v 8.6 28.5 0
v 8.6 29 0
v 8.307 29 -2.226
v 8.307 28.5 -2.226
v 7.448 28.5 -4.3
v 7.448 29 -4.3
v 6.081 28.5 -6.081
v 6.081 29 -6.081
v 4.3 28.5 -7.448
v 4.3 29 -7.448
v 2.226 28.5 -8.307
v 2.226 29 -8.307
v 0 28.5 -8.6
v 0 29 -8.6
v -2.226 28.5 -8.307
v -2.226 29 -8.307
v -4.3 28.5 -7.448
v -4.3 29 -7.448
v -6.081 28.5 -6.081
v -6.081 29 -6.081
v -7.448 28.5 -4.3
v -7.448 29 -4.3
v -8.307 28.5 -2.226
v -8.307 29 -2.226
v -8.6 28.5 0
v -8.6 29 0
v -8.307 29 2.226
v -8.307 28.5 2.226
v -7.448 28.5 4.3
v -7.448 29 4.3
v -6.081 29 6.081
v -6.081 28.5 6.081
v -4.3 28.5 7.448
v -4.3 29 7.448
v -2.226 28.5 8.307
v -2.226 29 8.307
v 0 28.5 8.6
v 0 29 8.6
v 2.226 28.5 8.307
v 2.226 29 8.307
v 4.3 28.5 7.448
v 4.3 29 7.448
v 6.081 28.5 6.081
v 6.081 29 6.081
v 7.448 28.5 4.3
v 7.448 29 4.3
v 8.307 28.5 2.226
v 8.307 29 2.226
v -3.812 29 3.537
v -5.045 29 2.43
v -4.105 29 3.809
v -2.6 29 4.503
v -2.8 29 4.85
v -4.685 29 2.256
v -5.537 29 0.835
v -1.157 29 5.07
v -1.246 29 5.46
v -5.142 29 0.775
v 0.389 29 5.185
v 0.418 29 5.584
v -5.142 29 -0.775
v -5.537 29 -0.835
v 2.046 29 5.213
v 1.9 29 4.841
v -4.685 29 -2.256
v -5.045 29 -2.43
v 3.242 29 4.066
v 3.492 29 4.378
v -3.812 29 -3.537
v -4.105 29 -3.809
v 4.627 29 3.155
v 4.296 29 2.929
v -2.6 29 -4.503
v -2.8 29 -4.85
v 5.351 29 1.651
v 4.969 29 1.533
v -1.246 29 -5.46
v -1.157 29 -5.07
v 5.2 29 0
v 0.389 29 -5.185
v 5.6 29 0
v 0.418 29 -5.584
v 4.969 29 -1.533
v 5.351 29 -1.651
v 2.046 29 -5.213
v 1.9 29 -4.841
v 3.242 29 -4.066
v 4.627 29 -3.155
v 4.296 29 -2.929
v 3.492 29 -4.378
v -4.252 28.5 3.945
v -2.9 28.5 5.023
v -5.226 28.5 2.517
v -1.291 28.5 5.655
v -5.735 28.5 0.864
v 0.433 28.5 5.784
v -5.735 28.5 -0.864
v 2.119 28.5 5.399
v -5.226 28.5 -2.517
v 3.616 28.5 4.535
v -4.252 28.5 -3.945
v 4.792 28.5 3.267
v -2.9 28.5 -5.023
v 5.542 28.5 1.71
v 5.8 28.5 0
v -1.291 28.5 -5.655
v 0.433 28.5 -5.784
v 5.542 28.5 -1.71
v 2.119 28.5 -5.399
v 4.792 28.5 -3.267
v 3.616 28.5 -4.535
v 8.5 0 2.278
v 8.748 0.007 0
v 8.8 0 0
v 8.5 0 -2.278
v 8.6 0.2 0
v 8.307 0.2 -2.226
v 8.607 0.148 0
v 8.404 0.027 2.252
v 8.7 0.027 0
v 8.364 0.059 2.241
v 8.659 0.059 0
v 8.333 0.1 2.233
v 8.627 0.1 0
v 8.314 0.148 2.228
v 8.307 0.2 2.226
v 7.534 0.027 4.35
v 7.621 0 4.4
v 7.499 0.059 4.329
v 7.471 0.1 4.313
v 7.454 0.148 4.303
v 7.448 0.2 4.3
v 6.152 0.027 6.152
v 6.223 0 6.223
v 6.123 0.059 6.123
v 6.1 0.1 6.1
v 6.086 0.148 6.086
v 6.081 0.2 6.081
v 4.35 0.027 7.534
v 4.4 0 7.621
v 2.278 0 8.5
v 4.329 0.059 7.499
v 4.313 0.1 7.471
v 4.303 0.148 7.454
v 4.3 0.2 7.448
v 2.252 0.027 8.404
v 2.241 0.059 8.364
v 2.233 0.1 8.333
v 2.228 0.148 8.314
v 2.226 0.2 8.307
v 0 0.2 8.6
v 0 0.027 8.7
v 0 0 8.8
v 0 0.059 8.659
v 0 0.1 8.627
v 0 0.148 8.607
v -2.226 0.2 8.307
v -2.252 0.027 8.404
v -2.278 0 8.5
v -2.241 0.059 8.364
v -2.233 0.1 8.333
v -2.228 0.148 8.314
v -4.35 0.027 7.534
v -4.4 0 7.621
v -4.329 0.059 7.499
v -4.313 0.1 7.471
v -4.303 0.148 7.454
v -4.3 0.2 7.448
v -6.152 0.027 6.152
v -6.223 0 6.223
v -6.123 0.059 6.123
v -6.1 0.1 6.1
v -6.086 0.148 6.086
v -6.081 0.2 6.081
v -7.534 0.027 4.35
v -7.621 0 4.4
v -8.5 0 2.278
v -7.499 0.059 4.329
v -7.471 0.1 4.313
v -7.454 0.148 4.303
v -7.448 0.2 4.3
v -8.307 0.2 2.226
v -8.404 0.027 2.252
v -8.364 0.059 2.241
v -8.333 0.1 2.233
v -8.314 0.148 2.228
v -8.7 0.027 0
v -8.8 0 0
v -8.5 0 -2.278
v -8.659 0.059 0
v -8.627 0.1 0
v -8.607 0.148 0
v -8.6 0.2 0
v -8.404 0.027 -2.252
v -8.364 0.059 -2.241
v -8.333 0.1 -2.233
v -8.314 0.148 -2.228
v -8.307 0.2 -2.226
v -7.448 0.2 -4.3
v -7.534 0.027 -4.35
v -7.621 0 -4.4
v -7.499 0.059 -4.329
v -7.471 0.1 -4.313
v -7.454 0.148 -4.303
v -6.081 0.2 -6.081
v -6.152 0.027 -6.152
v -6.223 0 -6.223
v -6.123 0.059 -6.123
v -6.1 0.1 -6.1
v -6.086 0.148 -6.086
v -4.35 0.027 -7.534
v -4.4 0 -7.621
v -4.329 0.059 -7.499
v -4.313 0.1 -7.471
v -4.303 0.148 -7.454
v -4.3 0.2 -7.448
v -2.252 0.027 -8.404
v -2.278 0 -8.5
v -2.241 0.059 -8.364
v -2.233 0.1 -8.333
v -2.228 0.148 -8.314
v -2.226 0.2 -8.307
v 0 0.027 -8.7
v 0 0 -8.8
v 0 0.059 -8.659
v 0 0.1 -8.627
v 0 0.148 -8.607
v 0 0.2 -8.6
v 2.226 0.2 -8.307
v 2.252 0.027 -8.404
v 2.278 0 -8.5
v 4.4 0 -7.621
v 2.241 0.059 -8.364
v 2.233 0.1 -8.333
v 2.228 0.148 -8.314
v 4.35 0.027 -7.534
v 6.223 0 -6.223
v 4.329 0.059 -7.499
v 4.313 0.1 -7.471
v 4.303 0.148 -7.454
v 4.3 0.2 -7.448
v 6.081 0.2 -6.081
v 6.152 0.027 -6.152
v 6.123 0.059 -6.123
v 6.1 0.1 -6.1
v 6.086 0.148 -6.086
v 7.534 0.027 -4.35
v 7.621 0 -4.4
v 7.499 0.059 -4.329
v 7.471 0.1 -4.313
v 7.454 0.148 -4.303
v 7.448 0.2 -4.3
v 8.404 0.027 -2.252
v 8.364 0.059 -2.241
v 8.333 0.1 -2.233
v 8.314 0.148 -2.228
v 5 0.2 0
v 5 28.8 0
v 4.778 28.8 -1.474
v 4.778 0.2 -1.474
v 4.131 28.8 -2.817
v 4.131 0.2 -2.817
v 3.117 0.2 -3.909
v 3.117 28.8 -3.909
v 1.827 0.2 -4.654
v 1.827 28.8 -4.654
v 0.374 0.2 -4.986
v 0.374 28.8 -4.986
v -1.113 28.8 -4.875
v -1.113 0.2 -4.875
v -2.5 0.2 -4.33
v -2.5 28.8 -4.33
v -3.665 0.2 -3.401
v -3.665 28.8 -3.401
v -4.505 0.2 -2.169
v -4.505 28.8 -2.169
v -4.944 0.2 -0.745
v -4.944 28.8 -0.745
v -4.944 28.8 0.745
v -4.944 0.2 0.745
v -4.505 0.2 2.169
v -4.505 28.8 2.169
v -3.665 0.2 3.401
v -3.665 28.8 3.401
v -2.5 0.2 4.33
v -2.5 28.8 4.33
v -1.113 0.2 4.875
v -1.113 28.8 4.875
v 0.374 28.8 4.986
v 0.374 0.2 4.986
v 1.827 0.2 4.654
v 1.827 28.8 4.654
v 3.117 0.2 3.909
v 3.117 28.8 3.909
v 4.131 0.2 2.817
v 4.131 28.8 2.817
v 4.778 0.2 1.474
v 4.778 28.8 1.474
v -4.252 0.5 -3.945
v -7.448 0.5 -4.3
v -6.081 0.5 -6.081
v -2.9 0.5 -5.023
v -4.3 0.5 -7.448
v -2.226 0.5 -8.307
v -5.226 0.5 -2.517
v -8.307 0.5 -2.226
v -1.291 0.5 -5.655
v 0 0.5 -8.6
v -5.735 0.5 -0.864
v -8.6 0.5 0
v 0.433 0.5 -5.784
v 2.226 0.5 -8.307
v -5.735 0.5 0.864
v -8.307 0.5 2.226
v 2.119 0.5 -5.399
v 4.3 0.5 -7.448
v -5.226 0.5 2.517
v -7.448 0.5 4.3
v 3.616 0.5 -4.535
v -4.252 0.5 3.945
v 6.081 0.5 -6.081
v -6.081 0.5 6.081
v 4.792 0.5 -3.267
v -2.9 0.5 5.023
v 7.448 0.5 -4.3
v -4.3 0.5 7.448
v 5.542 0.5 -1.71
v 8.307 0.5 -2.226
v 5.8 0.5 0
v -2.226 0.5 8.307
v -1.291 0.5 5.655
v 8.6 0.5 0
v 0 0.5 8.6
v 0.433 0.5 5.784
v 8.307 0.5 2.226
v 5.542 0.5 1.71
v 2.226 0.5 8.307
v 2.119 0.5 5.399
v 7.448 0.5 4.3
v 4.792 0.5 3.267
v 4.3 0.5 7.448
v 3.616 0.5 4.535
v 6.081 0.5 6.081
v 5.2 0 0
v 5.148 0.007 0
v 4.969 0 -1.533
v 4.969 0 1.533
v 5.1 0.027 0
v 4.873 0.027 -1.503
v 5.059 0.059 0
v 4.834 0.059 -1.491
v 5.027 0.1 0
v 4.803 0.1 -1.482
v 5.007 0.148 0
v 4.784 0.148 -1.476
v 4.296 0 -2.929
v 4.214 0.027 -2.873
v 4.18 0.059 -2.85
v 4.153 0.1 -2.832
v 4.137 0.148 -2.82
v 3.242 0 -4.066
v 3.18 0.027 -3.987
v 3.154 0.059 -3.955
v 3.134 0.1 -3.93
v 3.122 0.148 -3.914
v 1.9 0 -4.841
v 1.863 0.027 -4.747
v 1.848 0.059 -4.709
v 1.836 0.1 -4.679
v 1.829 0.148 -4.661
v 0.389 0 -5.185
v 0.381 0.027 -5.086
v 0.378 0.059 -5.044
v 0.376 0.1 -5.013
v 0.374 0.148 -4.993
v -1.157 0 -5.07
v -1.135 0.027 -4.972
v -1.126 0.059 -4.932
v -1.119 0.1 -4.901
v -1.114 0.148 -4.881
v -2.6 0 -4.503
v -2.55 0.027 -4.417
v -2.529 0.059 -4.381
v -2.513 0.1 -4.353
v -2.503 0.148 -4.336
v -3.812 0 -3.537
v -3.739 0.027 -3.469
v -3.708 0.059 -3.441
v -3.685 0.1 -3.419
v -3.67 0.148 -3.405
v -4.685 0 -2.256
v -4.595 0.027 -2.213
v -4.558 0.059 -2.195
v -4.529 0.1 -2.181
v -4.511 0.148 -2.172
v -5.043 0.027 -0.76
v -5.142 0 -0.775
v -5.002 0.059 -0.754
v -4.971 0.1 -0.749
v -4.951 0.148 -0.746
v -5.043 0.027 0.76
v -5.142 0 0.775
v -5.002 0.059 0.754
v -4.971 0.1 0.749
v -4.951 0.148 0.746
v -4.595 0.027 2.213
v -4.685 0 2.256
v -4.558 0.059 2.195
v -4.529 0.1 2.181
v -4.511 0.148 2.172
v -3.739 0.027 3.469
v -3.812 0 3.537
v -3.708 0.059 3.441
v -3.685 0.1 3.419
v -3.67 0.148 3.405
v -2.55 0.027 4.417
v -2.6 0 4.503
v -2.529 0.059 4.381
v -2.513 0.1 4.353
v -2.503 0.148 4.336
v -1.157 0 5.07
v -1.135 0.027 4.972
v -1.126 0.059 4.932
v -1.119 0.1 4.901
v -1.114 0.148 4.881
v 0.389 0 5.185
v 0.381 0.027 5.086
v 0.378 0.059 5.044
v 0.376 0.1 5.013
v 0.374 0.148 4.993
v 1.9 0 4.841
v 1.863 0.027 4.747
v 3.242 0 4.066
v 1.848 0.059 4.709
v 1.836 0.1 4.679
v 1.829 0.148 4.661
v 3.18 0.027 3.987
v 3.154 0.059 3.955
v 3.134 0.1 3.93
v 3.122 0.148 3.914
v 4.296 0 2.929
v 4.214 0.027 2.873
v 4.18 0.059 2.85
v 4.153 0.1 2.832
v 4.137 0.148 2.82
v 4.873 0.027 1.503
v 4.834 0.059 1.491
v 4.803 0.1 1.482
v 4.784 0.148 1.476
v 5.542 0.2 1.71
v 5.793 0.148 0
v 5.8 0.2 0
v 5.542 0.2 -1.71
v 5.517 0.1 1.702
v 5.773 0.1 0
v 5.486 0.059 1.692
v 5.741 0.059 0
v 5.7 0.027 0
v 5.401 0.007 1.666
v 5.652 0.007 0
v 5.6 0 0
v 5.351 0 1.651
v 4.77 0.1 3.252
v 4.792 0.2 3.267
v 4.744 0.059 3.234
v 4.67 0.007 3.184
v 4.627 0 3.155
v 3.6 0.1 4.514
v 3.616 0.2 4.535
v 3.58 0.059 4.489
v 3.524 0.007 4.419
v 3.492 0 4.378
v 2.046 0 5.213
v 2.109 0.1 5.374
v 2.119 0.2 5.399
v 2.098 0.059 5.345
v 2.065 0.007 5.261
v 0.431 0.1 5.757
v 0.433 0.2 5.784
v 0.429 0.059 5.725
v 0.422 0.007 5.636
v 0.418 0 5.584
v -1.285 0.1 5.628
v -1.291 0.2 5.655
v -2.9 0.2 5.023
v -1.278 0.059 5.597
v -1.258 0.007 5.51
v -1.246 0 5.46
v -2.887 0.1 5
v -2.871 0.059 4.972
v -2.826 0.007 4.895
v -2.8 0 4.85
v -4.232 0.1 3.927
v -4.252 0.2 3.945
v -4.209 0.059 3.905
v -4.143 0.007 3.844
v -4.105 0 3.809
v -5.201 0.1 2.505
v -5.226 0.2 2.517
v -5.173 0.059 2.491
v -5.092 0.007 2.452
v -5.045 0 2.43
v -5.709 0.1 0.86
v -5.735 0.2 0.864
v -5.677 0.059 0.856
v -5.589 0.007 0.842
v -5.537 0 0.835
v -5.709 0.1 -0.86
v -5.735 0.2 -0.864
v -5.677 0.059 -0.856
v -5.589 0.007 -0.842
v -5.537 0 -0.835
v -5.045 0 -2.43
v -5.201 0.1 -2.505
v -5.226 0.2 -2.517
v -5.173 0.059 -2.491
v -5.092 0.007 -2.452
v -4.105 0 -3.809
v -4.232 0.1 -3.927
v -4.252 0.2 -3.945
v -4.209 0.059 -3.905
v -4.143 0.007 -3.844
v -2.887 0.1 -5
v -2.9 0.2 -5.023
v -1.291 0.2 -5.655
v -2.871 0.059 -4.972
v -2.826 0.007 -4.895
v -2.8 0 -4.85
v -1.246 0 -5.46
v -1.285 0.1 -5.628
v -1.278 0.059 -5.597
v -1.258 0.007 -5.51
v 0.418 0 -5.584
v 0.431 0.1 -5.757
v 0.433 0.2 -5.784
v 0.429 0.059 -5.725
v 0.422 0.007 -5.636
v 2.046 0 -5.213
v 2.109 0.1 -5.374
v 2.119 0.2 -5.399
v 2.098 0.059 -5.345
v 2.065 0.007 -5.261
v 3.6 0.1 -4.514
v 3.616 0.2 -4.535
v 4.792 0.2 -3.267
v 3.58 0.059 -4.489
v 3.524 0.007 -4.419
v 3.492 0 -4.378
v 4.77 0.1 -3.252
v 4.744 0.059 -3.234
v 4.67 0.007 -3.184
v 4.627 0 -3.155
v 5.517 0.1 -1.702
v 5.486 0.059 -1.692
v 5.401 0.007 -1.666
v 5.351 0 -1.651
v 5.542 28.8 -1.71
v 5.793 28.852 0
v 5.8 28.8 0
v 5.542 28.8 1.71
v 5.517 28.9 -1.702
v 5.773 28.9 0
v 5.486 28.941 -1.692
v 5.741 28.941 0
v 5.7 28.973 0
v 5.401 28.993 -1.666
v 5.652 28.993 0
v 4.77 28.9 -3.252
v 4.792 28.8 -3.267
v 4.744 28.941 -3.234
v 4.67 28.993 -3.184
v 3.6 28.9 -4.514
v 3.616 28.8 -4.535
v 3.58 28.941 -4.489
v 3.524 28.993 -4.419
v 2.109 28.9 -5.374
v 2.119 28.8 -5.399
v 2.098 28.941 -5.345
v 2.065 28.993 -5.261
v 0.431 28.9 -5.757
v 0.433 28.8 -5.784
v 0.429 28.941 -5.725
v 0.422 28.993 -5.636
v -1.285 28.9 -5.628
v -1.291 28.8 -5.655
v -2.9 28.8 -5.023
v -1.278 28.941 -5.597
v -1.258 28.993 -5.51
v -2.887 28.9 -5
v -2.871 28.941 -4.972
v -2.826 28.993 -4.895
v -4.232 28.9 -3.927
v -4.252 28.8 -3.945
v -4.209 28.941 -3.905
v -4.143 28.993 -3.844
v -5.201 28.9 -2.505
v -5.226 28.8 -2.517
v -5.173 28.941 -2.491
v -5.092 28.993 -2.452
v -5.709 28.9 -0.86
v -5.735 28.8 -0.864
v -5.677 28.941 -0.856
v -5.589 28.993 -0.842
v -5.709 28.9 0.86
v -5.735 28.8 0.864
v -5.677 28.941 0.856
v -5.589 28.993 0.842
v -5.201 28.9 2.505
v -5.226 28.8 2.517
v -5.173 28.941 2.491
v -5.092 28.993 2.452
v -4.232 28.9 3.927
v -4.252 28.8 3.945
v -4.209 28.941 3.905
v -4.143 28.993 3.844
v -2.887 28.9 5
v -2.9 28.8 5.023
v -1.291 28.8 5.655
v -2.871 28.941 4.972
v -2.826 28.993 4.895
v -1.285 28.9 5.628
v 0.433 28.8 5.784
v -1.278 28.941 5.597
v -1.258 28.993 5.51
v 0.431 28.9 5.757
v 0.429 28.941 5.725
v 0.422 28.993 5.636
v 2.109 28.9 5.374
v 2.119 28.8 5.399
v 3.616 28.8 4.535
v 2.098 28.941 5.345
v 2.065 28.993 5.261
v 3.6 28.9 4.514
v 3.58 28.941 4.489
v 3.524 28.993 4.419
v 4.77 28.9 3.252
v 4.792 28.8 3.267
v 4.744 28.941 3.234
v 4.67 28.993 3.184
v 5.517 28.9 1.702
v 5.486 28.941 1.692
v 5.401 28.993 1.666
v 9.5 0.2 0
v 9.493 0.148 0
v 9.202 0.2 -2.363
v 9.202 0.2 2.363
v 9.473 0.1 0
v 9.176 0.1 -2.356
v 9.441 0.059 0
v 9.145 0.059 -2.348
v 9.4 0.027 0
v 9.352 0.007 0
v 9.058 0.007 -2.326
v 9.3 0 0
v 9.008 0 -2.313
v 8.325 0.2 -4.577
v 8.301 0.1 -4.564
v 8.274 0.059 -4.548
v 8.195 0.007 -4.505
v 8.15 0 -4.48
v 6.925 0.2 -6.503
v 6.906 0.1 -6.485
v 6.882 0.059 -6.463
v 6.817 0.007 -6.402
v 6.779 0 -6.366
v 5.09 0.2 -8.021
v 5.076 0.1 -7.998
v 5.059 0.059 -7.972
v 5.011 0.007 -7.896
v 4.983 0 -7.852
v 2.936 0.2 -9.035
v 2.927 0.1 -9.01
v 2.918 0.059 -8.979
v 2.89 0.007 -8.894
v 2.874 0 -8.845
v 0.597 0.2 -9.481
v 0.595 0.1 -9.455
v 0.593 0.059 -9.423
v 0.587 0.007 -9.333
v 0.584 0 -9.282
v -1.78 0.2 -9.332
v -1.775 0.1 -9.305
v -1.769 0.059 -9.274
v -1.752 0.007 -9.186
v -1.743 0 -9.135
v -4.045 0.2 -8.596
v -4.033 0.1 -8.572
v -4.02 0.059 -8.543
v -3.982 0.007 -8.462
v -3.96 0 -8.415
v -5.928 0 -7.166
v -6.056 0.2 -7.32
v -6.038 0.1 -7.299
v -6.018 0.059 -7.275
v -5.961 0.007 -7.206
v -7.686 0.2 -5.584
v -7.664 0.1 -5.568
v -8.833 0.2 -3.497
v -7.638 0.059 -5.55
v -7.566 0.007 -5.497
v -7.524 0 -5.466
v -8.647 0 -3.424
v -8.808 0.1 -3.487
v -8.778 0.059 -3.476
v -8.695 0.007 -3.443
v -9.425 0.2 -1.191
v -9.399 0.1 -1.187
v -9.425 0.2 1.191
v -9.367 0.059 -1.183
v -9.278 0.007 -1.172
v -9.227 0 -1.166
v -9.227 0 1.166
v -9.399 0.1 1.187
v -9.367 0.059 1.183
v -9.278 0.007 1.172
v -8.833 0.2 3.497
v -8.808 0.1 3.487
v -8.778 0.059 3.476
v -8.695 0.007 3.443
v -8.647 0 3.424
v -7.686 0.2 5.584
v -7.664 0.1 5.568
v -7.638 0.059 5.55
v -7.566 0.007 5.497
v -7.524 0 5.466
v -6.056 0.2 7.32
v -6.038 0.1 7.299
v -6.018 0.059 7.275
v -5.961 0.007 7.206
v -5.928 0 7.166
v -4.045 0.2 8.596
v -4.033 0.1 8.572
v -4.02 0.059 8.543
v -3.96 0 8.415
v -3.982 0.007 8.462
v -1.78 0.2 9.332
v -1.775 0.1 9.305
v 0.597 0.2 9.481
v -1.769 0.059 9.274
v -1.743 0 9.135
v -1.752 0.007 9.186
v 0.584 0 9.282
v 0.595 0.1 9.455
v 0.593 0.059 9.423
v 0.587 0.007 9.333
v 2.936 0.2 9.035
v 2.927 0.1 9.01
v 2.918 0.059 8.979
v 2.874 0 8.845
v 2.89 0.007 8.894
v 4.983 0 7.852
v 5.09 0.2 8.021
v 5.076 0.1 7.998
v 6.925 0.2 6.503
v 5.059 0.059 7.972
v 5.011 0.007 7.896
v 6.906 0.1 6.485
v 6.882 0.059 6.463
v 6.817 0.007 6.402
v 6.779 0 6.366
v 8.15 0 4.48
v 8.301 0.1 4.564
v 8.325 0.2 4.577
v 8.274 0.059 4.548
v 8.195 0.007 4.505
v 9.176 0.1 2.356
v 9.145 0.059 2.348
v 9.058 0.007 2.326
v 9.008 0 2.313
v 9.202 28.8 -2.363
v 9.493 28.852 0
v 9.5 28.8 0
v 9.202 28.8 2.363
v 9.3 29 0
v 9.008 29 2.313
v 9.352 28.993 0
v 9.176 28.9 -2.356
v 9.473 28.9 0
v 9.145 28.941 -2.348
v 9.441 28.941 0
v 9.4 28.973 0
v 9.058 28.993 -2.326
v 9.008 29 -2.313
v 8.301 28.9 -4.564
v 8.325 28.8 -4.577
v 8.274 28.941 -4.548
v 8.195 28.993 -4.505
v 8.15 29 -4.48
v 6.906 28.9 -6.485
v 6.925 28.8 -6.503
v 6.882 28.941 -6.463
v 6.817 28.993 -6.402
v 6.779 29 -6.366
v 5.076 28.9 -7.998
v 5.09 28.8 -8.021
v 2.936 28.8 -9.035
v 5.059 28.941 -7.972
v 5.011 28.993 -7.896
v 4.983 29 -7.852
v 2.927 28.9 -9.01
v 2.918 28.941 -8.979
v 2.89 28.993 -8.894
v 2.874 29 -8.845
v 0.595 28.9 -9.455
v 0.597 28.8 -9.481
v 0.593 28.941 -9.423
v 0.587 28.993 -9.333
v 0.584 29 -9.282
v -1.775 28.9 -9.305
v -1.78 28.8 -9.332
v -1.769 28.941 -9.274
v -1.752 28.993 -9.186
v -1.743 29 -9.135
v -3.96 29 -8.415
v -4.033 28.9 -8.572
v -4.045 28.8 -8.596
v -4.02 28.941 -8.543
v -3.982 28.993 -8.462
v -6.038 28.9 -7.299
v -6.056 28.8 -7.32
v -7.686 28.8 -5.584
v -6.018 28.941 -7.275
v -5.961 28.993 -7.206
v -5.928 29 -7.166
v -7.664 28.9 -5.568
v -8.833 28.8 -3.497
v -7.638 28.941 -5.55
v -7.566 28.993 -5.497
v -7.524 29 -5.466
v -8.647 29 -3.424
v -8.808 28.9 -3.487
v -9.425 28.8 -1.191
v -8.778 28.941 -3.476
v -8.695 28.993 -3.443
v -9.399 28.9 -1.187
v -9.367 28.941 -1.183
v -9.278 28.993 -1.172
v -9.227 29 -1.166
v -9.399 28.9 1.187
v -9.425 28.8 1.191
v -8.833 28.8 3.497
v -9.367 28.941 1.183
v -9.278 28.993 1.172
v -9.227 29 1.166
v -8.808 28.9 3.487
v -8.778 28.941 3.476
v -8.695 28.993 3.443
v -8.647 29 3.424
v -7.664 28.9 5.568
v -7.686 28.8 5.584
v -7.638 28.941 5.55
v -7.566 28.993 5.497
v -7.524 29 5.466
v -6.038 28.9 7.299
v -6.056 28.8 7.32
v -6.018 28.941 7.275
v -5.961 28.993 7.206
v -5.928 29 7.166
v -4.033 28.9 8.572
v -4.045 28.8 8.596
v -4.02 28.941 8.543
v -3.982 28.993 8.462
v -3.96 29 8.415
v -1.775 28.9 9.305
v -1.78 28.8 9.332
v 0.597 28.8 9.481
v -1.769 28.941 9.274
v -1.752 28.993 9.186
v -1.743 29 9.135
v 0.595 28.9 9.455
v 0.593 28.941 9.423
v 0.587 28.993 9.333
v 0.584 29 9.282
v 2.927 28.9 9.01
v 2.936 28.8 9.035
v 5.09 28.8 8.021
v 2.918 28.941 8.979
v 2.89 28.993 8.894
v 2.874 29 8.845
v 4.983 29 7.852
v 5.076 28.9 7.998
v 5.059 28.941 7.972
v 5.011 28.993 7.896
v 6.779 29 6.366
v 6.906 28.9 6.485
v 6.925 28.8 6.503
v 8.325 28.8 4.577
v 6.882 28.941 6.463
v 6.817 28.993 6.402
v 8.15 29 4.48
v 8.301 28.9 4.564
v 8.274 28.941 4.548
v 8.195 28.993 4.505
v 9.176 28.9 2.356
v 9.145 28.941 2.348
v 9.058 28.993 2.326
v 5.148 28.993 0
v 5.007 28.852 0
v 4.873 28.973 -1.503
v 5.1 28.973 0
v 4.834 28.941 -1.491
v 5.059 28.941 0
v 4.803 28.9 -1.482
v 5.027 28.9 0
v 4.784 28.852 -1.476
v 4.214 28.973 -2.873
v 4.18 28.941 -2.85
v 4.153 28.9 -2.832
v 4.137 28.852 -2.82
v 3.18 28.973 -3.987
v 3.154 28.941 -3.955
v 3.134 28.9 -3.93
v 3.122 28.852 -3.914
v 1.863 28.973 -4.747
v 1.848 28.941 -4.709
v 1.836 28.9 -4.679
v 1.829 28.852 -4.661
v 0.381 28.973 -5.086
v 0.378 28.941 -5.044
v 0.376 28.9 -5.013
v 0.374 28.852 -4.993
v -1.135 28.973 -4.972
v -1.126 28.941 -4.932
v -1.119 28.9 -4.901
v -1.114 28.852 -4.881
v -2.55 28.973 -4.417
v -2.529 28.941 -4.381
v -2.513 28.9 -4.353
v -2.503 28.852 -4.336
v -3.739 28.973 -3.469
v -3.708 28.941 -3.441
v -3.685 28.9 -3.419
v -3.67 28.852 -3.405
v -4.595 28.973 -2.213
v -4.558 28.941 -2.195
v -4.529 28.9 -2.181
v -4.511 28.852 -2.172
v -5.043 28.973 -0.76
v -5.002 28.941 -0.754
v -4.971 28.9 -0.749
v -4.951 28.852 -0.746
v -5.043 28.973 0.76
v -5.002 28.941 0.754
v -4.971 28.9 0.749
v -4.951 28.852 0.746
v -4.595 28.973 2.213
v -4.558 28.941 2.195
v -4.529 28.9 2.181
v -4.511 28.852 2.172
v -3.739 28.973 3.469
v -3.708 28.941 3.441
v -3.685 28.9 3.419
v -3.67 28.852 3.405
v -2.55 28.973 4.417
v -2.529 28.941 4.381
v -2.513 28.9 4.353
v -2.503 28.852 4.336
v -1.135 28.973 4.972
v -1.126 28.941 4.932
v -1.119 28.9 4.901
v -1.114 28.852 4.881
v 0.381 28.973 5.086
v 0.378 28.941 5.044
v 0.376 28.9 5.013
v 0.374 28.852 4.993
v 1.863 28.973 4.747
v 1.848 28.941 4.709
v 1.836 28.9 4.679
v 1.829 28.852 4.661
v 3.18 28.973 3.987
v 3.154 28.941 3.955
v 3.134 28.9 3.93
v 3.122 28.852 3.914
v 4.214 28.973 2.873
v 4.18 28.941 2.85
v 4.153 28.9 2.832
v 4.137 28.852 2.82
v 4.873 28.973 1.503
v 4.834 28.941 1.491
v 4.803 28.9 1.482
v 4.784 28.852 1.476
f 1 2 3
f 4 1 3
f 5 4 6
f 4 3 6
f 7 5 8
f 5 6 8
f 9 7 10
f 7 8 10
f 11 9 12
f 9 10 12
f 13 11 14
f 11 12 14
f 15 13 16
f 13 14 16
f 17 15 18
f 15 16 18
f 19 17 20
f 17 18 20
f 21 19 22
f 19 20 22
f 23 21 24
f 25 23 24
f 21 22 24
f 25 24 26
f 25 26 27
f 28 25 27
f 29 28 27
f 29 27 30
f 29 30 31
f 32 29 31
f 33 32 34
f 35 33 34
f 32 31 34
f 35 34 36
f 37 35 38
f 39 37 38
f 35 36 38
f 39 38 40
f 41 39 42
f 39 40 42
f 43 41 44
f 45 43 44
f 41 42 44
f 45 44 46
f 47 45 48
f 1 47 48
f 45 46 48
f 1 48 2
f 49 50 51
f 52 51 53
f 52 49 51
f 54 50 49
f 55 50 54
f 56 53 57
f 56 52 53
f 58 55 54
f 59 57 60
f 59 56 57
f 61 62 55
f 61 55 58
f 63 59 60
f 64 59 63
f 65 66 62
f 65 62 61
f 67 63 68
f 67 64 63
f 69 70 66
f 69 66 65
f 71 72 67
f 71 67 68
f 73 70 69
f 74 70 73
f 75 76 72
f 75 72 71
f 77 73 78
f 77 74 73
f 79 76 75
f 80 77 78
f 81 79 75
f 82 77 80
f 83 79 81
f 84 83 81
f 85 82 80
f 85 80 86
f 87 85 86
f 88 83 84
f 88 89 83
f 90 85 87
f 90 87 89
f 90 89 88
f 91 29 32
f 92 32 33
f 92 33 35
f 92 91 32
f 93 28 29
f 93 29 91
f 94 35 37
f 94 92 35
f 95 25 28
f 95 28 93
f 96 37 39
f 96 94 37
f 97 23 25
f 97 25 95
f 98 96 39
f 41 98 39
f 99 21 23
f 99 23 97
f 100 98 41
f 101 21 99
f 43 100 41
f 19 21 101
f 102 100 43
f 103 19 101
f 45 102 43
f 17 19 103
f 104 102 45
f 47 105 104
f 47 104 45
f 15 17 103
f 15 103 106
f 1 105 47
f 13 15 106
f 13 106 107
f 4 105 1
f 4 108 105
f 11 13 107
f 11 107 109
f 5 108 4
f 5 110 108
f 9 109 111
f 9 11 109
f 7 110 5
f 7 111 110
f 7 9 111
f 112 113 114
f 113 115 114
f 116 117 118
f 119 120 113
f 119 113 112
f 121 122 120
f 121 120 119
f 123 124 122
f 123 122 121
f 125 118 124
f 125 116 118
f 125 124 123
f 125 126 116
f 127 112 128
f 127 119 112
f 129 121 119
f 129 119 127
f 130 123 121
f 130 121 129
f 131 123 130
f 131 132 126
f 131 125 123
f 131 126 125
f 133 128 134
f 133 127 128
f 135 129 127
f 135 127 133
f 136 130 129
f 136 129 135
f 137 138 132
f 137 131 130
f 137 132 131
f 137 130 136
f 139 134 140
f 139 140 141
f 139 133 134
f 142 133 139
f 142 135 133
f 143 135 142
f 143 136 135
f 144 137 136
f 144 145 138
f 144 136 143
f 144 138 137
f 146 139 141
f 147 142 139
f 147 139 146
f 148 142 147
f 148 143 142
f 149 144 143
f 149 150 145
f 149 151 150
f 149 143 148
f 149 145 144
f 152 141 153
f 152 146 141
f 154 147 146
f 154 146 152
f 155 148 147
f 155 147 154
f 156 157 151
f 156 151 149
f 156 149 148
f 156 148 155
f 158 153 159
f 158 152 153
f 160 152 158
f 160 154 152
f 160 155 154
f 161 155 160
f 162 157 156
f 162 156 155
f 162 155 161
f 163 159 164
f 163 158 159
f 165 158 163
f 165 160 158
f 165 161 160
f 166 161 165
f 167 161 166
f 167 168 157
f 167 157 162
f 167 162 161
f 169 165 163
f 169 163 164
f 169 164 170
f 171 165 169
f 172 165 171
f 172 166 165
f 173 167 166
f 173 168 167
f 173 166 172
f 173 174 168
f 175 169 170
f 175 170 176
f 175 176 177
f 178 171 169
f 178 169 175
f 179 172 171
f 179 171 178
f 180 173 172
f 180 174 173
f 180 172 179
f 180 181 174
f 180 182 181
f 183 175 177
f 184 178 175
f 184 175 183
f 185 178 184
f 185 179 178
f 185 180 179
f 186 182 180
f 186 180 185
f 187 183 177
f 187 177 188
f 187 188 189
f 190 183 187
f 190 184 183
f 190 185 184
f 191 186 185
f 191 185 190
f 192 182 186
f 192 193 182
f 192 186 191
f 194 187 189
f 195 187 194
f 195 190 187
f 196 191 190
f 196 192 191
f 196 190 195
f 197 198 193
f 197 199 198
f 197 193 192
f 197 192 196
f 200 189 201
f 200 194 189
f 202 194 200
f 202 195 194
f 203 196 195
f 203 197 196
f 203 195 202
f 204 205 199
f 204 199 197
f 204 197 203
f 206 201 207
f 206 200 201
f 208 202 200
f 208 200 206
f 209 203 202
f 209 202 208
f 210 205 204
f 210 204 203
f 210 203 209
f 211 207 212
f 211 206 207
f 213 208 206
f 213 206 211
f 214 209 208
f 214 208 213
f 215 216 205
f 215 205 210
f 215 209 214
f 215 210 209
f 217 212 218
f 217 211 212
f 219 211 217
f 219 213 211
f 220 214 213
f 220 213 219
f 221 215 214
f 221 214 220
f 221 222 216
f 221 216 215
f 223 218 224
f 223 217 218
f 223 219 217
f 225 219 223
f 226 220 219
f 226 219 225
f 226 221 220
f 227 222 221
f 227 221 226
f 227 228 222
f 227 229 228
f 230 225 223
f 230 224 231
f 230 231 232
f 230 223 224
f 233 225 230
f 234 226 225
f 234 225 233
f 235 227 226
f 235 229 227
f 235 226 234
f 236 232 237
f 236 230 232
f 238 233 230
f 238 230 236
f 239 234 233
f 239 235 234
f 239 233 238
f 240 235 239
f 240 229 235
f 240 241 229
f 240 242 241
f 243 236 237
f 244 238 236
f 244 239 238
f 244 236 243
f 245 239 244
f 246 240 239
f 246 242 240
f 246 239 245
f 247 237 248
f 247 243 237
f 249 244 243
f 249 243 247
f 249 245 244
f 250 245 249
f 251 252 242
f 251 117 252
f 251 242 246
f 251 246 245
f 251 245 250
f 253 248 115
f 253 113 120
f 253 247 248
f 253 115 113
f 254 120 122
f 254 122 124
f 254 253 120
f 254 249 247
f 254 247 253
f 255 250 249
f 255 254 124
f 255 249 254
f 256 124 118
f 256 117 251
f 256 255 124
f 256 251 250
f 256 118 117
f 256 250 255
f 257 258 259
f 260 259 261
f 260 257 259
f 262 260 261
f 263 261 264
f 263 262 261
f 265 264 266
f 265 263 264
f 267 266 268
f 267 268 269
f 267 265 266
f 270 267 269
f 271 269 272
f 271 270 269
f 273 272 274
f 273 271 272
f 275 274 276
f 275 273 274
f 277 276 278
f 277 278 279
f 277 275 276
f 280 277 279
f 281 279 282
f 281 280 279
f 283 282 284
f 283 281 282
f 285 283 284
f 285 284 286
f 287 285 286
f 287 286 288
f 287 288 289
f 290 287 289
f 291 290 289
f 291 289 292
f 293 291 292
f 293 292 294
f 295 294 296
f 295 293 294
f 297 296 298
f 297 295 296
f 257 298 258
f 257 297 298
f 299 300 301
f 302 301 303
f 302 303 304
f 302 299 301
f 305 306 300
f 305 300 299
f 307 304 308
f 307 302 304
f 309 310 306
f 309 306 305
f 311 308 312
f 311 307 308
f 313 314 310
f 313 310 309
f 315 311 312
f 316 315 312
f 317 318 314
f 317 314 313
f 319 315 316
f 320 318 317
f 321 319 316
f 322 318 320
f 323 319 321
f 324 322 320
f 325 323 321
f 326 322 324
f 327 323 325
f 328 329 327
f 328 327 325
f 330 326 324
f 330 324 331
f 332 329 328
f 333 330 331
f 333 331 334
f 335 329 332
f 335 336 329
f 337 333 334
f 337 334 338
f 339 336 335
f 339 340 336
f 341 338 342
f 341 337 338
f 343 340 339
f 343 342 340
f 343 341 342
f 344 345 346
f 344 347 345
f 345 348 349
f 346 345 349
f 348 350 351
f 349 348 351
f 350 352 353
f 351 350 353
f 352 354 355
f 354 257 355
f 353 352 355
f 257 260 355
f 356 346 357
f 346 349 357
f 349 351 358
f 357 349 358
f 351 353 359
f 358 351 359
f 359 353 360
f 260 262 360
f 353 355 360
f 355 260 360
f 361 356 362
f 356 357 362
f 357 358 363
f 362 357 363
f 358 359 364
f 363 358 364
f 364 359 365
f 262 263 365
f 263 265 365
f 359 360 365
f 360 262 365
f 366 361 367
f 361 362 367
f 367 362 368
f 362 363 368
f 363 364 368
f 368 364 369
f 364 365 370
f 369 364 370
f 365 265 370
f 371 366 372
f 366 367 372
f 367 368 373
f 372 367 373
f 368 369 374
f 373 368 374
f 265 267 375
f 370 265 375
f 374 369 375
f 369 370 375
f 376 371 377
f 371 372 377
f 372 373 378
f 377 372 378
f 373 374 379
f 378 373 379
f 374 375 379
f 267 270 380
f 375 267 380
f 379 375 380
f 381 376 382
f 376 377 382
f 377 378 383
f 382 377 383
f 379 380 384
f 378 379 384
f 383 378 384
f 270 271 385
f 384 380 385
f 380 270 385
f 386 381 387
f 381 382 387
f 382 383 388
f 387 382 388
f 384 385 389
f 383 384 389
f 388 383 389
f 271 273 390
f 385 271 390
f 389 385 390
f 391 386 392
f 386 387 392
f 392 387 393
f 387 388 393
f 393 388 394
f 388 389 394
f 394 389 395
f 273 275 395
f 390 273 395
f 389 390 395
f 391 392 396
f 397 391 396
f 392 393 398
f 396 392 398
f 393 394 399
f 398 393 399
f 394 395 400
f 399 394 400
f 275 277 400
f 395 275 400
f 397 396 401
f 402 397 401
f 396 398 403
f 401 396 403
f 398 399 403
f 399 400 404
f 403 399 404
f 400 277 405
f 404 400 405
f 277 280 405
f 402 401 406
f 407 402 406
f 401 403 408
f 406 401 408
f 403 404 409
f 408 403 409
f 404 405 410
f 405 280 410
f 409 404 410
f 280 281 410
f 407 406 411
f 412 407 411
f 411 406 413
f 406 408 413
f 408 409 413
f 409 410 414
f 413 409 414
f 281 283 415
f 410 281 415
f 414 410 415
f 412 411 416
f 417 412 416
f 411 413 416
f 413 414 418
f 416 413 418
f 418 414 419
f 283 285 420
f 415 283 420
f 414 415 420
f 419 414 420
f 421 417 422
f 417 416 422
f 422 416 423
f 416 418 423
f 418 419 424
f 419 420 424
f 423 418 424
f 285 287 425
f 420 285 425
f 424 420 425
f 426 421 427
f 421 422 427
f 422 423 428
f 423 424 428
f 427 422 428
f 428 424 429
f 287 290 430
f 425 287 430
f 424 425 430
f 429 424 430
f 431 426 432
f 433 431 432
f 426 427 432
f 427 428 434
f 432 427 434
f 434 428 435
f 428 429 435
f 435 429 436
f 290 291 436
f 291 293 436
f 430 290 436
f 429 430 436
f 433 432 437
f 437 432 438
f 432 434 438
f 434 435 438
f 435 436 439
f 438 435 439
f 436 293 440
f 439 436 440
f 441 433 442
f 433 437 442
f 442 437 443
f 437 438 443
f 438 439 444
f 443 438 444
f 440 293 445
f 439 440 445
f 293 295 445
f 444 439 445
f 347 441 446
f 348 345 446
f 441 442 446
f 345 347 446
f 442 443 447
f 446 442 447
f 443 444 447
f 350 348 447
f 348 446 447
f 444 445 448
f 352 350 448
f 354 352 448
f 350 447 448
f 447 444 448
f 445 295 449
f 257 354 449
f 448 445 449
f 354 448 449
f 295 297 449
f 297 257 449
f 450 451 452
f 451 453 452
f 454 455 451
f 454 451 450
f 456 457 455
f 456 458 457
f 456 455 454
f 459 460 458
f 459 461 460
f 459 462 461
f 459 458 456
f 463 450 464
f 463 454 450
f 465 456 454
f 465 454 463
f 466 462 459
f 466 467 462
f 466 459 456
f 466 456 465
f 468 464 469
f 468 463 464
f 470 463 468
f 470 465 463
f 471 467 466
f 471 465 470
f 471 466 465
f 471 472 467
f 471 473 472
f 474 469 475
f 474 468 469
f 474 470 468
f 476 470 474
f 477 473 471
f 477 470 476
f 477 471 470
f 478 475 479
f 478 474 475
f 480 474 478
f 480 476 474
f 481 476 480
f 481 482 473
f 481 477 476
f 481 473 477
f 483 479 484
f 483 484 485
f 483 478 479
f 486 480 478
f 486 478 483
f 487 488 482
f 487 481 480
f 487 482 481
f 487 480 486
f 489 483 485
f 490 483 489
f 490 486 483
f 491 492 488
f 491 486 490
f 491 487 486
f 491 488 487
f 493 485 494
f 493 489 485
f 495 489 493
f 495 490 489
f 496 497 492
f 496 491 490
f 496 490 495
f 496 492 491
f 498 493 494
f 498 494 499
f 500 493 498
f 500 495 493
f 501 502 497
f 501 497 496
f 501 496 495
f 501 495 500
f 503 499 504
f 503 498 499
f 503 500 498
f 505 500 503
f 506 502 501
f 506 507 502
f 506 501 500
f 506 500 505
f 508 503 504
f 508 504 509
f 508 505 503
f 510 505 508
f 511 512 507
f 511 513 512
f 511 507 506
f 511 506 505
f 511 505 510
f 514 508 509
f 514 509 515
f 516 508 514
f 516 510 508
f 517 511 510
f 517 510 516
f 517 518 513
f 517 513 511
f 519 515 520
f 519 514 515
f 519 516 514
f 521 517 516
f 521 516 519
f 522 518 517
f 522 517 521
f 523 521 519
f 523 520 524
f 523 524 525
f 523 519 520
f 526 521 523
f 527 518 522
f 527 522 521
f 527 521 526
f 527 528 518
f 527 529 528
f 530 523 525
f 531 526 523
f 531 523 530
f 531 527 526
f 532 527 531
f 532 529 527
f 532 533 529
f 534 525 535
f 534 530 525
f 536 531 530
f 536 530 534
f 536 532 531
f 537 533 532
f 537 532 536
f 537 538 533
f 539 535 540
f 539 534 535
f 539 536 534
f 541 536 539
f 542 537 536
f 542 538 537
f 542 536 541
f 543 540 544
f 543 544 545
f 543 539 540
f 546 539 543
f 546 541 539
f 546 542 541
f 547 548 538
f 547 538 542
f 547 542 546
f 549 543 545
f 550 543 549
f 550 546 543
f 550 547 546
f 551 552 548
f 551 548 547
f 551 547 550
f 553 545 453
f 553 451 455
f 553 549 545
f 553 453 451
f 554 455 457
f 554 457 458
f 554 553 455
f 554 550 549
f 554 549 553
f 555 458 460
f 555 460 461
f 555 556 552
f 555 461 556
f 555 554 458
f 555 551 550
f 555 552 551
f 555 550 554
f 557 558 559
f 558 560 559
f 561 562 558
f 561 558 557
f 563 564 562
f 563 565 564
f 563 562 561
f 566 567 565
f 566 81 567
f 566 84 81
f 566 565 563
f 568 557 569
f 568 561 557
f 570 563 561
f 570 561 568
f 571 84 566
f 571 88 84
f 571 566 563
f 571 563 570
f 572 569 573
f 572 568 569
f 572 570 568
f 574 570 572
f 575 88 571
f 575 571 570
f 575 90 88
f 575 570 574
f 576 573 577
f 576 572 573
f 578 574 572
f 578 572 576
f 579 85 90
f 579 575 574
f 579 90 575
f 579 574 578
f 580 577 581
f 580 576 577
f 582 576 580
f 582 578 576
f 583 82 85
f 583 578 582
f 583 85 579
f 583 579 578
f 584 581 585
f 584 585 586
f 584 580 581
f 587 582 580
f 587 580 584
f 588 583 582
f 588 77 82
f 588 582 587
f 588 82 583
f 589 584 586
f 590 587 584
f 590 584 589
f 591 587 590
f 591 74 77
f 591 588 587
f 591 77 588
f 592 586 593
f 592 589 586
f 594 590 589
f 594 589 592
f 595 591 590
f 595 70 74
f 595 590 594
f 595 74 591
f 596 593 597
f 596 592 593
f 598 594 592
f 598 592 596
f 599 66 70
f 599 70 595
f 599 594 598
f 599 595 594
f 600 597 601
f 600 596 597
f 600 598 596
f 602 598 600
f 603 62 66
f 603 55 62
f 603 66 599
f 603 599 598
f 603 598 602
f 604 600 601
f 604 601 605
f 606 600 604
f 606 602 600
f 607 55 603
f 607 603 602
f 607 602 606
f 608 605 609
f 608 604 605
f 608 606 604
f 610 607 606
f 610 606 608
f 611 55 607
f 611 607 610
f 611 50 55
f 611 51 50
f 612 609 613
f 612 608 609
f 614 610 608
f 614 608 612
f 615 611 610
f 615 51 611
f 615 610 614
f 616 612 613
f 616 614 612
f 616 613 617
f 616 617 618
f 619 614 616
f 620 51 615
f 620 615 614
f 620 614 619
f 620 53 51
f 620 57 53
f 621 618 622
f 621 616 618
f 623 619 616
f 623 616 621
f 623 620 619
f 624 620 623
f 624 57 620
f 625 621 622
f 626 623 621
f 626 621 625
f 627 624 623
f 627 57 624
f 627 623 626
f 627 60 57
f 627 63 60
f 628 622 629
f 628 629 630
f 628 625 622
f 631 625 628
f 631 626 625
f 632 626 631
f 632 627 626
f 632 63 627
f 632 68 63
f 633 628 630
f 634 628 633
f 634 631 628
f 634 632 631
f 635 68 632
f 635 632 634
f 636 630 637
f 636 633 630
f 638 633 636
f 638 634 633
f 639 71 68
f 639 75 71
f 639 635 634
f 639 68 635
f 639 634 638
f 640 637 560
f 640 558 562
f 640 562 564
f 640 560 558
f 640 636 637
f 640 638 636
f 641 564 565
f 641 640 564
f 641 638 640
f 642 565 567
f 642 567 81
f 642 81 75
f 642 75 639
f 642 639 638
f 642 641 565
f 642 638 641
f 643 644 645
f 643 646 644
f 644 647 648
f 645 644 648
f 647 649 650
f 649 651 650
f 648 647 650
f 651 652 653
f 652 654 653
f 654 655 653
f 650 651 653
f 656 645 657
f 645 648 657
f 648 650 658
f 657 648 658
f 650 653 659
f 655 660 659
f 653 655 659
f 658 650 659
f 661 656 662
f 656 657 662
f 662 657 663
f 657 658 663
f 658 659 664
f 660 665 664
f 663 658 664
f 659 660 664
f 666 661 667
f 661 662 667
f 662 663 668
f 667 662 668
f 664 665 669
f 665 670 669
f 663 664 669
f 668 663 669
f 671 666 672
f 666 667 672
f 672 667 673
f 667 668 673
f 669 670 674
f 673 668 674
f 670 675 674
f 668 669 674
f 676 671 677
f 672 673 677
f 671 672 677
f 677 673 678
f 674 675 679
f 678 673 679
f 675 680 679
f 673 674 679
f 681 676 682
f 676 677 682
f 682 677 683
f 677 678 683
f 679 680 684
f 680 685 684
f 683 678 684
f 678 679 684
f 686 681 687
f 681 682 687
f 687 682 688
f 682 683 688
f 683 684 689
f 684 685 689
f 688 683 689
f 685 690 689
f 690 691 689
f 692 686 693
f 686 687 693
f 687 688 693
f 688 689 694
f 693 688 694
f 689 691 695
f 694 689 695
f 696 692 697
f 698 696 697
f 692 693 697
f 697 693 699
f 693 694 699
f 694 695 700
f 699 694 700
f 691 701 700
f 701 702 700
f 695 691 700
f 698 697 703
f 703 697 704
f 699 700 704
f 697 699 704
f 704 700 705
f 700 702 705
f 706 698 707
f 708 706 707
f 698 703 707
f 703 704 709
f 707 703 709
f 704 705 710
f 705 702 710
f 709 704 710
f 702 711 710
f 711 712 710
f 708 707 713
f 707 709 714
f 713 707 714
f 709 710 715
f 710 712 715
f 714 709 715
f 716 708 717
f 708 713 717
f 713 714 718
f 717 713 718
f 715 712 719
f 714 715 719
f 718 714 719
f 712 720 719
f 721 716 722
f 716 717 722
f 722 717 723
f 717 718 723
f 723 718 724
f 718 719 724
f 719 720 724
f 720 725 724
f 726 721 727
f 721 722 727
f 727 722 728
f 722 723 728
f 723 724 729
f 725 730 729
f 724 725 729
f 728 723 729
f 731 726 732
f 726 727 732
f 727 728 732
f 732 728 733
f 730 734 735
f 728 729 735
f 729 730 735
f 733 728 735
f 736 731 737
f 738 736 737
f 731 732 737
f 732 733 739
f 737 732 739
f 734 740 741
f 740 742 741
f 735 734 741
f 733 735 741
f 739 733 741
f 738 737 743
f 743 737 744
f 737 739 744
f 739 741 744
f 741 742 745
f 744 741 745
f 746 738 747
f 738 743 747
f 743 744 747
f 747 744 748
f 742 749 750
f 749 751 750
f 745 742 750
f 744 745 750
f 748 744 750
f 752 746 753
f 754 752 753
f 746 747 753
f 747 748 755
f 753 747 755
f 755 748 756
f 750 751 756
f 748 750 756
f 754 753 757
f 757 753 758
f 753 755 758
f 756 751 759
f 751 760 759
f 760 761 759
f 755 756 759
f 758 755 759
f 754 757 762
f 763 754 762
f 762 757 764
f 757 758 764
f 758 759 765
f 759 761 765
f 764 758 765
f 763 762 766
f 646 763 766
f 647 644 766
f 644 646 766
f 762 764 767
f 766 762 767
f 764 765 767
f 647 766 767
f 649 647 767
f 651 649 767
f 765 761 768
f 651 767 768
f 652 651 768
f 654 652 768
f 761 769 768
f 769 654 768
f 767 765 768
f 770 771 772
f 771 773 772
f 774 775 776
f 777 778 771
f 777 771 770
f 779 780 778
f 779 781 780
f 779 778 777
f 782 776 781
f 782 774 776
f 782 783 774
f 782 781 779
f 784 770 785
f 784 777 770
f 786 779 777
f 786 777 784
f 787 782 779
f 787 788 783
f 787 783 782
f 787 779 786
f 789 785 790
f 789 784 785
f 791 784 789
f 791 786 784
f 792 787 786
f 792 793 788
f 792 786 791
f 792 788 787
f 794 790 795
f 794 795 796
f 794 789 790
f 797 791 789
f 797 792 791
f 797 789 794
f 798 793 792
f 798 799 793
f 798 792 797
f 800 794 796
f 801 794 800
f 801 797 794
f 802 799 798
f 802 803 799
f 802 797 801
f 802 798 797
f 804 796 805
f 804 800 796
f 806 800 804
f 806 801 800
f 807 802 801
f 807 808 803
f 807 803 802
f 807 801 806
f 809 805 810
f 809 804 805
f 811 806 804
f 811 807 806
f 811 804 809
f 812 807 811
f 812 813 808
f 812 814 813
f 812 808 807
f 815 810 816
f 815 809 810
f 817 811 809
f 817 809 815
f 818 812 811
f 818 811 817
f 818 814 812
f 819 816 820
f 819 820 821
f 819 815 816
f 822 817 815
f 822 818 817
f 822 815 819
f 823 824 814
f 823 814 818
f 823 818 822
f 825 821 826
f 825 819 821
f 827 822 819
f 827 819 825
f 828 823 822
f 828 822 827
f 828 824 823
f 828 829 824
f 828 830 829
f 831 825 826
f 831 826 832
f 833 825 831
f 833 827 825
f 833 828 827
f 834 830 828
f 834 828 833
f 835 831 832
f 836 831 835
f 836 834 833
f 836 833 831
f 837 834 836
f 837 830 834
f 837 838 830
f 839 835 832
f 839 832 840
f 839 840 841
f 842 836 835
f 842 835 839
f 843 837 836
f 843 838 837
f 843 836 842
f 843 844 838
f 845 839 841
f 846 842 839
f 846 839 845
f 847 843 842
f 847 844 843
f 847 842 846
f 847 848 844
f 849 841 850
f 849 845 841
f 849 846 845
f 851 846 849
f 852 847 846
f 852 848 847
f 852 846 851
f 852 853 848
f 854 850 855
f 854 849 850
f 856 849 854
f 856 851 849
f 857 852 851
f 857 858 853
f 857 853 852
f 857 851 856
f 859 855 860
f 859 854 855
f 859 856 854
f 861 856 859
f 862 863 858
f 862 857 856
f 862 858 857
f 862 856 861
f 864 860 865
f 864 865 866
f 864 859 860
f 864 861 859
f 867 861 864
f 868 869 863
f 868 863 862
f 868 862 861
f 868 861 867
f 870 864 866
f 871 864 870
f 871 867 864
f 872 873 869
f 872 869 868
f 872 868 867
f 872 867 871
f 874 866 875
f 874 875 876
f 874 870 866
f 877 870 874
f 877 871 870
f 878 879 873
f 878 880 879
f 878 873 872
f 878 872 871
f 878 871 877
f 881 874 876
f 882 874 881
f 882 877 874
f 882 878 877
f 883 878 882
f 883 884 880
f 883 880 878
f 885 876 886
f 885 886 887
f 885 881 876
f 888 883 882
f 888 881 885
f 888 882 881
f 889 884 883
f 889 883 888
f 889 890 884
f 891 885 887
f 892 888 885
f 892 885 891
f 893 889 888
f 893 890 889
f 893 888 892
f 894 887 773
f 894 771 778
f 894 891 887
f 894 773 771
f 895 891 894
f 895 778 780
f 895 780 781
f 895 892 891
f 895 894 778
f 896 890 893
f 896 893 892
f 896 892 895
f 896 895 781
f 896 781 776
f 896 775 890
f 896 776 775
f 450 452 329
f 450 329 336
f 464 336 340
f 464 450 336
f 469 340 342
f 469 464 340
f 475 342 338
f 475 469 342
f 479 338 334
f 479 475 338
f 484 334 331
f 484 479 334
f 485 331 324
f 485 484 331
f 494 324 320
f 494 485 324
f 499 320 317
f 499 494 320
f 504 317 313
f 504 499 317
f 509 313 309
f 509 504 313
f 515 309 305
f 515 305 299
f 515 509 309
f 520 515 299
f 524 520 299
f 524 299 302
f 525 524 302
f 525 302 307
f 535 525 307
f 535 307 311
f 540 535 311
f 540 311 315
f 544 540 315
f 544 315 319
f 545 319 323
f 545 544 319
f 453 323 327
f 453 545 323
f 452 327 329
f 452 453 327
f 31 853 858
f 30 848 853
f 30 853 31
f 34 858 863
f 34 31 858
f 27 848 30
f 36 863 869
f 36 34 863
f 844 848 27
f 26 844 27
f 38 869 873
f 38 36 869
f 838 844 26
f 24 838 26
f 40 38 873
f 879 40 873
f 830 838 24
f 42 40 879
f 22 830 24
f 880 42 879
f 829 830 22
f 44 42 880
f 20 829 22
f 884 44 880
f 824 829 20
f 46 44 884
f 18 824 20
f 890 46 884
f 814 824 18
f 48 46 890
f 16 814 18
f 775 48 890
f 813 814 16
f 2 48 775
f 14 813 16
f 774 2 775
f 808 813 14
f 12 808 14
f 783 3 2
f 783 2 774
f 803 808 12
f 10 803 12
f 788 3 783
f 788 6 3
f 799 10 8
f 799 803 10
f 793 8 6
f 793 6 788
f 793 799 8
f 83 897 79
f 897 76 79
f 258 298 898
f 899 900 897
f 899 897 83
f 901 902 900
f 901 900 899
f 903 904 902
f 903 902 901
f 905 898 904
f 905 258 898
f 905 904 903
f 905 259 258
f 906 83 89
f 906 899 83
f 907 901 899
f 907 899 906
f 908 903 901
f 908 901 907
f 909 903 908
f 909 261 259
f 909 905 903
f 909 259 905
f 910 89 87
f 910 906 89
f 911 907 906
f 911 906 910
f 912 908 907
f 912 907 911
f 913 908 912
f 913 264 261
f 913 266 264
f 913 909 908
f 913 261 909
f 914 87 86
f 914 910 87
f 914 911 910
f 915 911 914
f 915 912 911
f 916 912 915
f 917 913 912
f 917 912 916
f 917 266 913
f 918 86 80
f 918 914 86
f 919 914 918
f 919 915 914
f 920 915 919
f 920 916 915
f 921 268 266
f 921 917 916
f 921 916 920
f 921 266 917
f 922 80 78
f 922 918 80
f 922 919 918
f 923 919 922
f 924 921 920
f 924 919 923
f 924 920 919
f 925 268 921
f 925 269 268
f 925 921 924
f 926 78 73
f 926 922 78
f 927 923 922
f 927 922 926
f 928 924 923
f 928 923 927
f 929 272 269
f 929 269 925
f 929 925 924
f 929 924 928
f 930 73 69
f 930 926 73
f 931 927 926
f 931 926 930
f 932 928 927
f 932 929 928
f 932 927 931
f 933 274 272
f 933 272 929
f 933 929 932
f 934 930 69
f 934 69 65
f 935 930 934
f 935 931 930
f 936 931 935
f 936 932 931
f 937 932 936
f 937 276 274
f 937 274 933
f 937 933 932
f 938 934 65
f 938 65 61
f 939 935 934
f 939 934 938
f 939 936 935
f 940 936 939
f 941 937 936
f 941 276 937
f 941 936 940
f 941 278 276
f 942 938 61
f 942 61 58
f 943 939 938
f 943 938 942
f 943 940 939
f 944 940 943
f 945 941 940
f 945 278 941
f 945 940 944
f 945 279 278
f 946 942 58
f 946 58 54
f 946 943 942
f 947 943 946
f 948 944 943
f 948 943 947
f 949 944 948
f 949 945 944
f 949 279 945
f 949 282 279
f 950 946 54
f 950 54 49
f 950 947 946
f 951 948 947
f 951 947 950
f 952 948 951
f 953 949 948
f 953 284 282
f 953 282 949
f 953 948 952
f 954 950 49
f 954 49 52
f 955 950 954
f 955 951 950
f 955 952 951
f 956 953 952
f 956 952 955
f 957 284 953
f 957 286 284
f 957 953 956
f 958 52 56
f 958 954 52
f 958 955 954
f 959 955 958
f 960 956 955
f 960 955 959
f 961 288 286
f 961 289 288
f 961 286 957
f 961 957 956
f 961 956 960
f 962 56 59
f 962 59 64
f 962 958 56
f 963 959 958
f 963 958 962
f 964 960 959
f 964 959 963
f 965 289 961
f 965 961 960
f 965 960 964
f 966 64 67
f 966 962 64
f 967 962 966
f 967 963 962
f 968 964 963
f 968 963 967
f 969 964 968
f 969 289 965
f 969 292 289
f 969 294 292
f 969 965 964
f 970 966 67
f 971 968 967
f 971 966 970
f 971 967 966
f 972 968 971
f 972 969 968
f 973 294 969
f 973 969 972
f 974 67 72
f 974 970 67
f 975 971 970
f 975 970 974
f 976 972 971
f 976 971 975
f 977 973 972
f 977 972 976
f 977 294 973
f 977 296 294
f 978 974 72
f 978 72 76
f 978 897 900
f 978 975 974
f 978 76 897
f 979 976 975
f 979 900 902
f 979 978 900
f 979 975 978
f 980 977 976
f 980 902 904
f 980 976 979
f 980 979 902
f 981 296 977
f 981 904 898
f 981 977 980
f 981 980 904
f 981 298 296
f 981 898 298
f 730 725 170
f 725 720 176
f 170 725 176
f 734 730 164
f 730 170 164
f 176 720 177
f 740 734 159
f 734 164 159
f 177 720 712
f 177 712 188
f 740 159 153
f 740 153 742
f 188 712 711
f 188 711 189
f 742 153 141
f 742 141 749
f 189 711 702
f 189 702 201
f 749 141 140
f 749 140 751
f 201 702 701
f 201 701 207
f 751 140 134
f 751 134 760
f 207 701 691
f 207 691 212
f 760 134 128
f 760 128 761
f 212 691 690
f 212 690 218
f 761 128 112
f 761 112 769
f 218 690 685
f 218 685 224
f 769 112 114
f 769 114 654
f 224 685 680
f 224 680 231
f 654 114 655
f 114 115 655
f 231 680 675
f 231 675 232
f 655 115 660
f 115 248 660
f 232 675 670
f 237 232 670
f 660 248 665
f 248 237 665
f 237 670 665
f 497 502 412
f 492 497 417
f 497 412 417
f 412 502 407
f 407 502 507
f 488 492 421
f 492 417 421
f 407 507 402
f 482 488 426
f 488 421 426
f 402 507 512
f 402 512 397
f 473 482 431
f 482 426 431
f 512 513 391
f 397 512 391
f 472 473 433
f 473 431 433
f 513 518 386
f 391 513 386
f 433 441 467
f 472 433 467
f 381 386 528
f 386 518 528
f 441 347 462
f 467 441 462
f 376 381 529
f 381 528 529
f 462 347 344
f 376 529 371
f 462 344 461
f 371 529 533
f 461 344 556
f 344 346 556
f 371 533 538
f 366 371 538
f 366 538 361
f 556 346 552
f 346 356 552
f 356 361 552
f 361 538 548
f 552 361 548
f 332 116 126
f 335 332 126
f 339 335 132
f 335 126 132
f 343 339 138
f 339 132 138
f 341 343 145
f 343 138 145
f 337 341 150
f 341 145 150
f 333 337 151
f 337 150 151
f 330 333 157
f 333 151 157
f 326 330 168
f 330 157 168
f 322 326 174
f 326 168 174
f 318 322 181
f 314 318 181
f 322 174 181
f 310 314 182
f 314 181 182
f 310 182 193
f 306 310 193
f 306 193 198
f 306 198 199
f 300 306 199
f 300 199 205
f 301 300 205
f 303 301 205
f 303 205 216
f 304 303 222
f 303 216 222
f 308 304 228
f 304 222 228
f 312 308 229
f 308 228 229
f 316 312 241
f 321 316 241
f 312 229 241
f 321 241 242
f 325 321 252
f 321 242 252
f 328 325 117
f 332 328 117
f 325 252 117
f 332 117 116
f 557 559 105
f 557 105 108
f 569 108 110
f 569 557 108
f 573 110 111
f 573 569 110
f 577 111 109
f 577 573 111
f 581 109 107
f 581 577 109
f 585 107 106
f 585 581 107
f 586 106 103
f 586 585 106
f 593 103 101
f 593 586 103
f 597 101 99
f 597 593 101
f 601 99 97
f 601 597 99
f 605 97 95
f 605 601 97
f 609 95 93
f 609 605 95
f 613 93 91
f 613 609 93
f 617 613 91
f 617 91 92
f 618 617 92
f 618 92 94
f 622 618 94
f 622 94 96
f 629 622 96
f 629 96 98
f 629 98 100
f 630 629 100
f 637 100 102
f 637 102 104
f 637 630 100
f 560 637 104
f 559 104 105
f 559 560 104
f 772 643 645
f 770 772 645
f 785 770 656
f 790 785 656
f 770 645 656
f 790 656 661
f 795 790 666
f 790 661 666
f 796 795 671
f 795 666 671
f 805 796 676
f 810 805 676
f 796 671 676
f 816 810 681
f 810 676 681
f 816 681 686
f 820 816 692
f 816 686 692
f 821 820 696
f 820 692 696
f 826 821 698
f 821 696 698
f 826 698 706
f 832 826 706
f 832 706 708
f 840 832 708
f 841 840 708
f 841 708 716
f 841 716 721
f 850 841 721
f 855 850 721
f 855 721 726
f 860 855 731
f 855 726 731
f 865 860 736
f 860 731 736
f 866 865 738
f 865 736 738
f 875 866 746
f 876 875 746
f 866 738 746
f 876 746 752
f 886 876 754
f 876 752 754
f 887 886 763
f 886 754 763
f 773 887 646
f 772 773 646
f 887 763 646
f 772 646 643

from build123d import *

# Parameters (mm, degrees)
SKETCH1_R           = 9.5
SKETCH1_R_2         = 5
BOSS_EXTRUDE1_DEPTH = 29
SKETCH2_R           = 8.6
SKETCH2_R_2         = 5.8
CUT_EXTRUDE1_DEPTH  = 0.5
SKETCH3_R           = 8.6
SKETCH3_R_2         = 5.8
CUT_EXTRUDE2_DEPTH  = 0.5
FILLET1_R           = 0.2


with BuildPart() as part:
    # Sketch1 → Boss-Extrude1 (new body)
    with BuildSketch(Plane(origin=(0, 0, 0), x_dir=(1, 0, 0), z_dir=(0, 1, 0))):
        Circle(SKETCH1_R)
        Circle(SKETCH1_R_2, mode=Mode.SUBTRACT)
    extrude(amount=BOSS_EXTRUDE1_DEPTH)

    # Sketch2 → Cut-Extrude1 (cut)
    with BuildSketch(Plane(origin=(0, 29, 0), x_dir=(1, 0, 0), z_dir=(0, 1, 0))):
        Circle(SKETCH2_R)
        Circle(SKETCH2_R_2, mode=Mode.SUBTRACT)
    extrude(amount=-CUT_EXTRUDE1_DEPTH, mode=Mode.SUBTRACT)

    # Sketch3 → Cut-Extrude2 (cut)
    with BuildSketch(Plane.XZ):
        Circle(SKETCH3_R)
        Circle(SKETCH3_R_2, mode=Mode.SUBTRACT)
    extrude(amount=-CUT_EXTRUDE2_DEPTH, mode=Mode.SUBTRACT)

    # Fillet1
    fillet1_edges = [part.edges().sort_by_distance(p)[0] for p in [
        (-9.5, 0, 0),
        (-9.5, 29, 0),
        (-8.6, 0, 0),
        (-5.8, 0, 0),
        (-5.8, 29, 0),
        (-5, 0, 0),
        (-5, 29, 0),
    ]]
    fillet(fillet1_edges, radius=FILLET1_R)


solid = part.part
